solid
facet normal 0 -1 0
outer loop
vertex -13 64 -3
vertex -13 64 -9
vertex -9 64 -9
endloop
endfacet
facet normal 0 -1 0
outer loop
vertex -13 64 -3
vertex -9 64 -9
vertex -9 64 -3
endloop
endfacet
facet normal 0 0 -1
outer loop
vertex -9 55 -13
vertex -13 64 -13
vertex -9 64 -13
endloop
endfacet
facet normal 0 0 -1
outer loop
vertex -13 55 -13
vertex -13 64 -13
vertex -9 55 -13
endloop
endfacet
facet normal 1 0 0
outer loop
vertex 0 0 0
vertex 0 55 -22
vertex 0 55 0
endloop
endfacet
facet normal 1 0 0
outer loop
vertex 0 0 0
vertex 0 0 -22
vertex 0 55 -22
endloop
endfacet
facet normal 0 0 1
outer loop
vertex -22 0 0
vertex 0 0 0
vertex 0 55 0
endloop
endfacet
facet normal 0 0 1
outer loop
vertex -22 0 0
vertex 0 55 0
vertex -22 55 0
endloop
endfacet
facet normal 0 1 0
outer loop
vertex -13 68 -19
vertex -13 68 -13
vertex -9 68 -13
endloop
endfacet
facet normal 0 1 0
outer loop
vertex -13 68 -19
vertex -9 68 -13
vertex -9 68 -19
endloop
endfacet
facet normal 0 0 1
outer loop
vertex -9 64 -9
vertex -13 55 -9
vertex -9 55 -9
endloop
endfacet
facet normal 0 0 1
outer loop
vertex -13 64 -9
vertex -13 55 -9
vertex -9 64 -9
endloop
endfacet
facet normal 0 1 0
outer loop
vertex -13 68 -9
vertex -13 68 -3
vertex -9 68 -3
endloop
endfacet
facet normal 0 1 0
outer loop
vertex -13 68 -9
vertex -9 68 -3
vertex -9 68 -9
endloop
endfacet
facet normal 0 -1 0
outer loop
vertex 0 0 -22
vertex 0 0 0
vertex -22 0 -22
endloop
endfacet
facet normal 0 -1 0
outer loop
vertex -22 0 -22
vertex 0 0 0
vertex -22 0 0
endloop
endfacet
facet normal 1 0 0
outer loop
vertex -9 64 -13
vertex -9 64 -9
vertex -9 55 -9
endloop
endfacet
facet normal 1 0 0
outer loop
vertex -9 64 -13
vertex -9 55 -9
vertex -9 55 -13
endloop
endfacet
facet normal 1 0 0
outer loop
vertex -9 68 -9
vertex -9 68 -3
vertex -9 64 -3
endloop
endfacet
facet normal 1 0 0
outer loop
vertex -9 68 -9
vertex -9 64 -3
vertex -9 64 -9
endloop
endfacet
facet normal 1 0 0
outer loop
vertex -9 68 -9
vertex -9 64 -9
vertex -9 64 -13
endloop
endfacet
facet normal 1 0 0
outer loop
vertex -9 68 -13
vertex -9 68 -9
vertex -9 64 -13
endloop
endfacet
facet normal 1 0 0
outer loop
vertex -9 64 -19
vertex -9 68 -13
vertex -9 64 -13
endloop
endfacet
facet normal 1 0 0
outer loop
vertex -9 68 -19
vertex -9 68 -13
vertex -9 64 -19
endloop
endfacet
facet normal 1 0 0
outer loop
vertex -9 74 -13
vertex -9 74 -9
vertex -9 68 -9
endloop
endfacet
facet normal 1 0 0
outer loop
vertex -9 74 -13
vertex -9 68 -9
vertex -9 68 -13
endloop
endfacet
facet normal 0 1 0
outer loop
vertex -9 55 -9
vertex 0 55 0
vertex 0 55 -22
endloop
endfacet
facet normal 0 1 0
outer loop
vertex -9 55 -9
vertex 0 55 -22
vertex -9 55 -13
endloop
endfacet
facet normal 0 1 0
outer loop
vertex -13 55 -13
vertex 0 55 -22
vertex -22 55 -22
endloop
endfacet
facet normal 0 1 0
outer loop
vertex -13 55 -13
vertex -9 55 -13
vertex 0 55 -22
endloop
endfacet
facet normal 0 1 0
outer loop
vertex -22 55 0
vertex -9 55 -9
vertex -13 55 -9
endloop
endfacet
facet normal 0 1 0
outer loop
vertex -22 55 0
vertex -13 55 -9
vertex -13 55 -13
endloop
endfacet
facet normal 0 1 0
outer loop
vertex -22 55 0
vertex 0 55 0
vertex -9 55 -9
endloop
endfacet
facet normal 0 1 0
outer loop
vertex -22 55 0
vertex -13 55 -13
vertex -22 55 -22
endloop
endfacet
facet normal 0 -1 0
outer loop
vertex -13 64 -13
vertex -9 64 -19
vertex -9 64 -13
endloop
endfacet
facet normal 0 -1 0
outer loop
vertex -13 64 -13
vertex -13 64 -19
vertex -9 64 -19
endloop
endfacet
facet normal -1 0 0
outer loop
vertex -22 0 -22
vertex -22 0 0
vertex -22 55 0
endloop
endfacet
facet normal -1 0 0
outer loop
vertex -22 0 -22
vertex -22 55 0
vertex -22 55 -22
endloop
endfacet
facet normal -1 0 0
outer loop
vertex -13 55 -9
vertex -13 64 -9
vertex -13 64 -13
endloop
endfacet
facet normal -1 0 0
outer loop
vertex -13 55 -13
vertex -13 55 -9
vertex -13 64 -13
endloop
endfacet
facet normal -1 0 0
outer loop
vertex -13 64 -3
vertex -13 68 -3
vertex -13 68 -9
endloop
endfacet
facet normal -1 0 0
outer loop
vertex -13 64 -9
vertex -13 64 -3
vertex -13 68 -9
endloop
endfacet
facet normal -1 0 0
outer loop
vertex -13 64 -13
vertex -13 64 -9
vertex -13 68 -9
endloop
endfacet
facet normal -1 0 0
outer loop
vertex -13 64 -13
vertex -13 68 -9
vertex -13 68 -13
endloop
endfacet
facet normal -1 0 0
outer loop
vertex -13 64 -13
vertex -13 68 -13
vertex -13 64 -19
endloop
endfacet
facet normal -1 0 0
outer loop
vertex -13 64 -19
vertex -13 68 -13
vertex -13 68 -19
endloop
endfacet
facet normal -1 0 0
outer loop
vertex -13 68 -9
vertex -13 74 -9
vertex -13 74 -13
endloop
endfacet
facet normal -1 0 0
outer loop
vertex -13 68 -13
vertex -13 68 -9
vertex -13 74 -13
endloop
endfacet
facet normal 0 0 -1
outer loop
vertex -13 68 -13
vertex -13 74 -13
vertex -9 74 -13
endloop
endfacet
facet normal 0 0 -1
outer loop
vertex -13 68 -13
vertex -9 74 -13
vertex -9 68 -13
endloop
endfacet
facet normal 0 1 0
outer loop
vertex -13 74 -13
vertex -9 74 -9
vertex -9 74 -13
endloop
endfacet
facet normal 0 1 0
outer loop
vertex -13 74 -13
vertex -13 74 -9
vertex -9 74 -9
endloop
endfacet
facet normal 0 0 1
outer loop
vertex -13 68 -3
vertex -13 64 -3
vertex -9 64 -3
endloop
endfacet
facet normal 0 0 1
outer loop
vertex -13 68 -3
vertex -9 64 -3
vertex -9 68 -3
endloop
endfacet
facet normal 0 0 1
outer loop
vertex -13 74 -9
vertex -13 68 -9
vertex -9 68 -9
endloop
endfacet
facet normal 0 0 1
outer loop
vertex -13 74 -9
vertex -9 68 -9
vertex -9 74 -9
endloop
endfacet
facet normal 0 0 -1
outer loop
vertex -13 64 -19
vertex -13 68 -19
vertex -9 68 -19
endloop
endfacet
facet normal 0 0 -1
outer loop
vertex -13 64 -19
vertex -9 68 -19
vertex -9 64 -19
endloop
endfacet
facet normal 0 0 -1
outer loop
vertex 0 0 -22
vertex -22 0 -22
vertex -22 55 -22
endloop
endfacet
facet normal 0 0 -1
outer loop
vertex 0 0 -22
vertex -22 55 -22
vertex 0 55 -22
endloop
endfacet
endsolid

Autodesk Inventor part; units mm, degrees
ref_plane "YZ Plane" through (0, 0, 0) normal (1, 0, 0) x (0, 1, 0)
ref_plane "XZ Plane" through (0, 0, 0) normal (0, 1, 0) x (-1, 0, 0)
ref_plane "XY Plane" through (0, 0, 0) normal (0, 0, 1) x (1, 0, 0)
sketch "Sketch1" plane through (0, 0, 0) normal (0, 1, 0) x (-1, 0, 0)
  line L0 (0, 0) -> (22, 0)
  line L1 (22, 0) -> (22, -22)
  line L2 (22, -22) -> (0, -22)
  line L3 (0, -22) -> (0, 0)
  dimension "d0" = 22
  dimension "d1" = 22
extrude "Extrusion1" add sketch "Sketch1" along normal blind 55
ref_plane "Work Plane1" through (-11, 0, 0) normal (1, 0, 0) x (0, 0, -1)
sketch "Sketch2" plane through (-11, 0, 0) normal (1, 0, 0) x (0, 0, -1)
  line L0 (0, 55) -> (22, 55) projected
  line L1 (11, 55) -> (9, 55)
  line L2 (22, 55) -> (0, 55) projected
  line L3 (9, 55) -> (9, 64)
  line L4 (9, 64) -> (3, 64)
  line L5 (3, 64) -> (3, 68)
  line L6 (3, 68) -> (9, 68)
  line L7 (9, 68) -> (9, 74)
  line L8 (9, 74) -> (13, 74)
  line L9 (13, 74) -> (13, 68)
  line L10 (13, 68) -> (19, 68)
  line L11 (19, 68) -> (19, 64)
  line L12 (19, 64) -> (13, 64)
  line L13 (13, 64) -> (13, 55)
  point P0 (0, 0)
  dimension "d4" = 2
  dimension "d5" = 9
  dimension "d6" = 6
  dimension "d7" = 4
  dimension "d8" = 6
  dimension "d9" = 4
  dimension "d10" = 6
extrude "Extrusion2" add sketch "Sketch2" along normal mid plane 4
properties part number "king"
